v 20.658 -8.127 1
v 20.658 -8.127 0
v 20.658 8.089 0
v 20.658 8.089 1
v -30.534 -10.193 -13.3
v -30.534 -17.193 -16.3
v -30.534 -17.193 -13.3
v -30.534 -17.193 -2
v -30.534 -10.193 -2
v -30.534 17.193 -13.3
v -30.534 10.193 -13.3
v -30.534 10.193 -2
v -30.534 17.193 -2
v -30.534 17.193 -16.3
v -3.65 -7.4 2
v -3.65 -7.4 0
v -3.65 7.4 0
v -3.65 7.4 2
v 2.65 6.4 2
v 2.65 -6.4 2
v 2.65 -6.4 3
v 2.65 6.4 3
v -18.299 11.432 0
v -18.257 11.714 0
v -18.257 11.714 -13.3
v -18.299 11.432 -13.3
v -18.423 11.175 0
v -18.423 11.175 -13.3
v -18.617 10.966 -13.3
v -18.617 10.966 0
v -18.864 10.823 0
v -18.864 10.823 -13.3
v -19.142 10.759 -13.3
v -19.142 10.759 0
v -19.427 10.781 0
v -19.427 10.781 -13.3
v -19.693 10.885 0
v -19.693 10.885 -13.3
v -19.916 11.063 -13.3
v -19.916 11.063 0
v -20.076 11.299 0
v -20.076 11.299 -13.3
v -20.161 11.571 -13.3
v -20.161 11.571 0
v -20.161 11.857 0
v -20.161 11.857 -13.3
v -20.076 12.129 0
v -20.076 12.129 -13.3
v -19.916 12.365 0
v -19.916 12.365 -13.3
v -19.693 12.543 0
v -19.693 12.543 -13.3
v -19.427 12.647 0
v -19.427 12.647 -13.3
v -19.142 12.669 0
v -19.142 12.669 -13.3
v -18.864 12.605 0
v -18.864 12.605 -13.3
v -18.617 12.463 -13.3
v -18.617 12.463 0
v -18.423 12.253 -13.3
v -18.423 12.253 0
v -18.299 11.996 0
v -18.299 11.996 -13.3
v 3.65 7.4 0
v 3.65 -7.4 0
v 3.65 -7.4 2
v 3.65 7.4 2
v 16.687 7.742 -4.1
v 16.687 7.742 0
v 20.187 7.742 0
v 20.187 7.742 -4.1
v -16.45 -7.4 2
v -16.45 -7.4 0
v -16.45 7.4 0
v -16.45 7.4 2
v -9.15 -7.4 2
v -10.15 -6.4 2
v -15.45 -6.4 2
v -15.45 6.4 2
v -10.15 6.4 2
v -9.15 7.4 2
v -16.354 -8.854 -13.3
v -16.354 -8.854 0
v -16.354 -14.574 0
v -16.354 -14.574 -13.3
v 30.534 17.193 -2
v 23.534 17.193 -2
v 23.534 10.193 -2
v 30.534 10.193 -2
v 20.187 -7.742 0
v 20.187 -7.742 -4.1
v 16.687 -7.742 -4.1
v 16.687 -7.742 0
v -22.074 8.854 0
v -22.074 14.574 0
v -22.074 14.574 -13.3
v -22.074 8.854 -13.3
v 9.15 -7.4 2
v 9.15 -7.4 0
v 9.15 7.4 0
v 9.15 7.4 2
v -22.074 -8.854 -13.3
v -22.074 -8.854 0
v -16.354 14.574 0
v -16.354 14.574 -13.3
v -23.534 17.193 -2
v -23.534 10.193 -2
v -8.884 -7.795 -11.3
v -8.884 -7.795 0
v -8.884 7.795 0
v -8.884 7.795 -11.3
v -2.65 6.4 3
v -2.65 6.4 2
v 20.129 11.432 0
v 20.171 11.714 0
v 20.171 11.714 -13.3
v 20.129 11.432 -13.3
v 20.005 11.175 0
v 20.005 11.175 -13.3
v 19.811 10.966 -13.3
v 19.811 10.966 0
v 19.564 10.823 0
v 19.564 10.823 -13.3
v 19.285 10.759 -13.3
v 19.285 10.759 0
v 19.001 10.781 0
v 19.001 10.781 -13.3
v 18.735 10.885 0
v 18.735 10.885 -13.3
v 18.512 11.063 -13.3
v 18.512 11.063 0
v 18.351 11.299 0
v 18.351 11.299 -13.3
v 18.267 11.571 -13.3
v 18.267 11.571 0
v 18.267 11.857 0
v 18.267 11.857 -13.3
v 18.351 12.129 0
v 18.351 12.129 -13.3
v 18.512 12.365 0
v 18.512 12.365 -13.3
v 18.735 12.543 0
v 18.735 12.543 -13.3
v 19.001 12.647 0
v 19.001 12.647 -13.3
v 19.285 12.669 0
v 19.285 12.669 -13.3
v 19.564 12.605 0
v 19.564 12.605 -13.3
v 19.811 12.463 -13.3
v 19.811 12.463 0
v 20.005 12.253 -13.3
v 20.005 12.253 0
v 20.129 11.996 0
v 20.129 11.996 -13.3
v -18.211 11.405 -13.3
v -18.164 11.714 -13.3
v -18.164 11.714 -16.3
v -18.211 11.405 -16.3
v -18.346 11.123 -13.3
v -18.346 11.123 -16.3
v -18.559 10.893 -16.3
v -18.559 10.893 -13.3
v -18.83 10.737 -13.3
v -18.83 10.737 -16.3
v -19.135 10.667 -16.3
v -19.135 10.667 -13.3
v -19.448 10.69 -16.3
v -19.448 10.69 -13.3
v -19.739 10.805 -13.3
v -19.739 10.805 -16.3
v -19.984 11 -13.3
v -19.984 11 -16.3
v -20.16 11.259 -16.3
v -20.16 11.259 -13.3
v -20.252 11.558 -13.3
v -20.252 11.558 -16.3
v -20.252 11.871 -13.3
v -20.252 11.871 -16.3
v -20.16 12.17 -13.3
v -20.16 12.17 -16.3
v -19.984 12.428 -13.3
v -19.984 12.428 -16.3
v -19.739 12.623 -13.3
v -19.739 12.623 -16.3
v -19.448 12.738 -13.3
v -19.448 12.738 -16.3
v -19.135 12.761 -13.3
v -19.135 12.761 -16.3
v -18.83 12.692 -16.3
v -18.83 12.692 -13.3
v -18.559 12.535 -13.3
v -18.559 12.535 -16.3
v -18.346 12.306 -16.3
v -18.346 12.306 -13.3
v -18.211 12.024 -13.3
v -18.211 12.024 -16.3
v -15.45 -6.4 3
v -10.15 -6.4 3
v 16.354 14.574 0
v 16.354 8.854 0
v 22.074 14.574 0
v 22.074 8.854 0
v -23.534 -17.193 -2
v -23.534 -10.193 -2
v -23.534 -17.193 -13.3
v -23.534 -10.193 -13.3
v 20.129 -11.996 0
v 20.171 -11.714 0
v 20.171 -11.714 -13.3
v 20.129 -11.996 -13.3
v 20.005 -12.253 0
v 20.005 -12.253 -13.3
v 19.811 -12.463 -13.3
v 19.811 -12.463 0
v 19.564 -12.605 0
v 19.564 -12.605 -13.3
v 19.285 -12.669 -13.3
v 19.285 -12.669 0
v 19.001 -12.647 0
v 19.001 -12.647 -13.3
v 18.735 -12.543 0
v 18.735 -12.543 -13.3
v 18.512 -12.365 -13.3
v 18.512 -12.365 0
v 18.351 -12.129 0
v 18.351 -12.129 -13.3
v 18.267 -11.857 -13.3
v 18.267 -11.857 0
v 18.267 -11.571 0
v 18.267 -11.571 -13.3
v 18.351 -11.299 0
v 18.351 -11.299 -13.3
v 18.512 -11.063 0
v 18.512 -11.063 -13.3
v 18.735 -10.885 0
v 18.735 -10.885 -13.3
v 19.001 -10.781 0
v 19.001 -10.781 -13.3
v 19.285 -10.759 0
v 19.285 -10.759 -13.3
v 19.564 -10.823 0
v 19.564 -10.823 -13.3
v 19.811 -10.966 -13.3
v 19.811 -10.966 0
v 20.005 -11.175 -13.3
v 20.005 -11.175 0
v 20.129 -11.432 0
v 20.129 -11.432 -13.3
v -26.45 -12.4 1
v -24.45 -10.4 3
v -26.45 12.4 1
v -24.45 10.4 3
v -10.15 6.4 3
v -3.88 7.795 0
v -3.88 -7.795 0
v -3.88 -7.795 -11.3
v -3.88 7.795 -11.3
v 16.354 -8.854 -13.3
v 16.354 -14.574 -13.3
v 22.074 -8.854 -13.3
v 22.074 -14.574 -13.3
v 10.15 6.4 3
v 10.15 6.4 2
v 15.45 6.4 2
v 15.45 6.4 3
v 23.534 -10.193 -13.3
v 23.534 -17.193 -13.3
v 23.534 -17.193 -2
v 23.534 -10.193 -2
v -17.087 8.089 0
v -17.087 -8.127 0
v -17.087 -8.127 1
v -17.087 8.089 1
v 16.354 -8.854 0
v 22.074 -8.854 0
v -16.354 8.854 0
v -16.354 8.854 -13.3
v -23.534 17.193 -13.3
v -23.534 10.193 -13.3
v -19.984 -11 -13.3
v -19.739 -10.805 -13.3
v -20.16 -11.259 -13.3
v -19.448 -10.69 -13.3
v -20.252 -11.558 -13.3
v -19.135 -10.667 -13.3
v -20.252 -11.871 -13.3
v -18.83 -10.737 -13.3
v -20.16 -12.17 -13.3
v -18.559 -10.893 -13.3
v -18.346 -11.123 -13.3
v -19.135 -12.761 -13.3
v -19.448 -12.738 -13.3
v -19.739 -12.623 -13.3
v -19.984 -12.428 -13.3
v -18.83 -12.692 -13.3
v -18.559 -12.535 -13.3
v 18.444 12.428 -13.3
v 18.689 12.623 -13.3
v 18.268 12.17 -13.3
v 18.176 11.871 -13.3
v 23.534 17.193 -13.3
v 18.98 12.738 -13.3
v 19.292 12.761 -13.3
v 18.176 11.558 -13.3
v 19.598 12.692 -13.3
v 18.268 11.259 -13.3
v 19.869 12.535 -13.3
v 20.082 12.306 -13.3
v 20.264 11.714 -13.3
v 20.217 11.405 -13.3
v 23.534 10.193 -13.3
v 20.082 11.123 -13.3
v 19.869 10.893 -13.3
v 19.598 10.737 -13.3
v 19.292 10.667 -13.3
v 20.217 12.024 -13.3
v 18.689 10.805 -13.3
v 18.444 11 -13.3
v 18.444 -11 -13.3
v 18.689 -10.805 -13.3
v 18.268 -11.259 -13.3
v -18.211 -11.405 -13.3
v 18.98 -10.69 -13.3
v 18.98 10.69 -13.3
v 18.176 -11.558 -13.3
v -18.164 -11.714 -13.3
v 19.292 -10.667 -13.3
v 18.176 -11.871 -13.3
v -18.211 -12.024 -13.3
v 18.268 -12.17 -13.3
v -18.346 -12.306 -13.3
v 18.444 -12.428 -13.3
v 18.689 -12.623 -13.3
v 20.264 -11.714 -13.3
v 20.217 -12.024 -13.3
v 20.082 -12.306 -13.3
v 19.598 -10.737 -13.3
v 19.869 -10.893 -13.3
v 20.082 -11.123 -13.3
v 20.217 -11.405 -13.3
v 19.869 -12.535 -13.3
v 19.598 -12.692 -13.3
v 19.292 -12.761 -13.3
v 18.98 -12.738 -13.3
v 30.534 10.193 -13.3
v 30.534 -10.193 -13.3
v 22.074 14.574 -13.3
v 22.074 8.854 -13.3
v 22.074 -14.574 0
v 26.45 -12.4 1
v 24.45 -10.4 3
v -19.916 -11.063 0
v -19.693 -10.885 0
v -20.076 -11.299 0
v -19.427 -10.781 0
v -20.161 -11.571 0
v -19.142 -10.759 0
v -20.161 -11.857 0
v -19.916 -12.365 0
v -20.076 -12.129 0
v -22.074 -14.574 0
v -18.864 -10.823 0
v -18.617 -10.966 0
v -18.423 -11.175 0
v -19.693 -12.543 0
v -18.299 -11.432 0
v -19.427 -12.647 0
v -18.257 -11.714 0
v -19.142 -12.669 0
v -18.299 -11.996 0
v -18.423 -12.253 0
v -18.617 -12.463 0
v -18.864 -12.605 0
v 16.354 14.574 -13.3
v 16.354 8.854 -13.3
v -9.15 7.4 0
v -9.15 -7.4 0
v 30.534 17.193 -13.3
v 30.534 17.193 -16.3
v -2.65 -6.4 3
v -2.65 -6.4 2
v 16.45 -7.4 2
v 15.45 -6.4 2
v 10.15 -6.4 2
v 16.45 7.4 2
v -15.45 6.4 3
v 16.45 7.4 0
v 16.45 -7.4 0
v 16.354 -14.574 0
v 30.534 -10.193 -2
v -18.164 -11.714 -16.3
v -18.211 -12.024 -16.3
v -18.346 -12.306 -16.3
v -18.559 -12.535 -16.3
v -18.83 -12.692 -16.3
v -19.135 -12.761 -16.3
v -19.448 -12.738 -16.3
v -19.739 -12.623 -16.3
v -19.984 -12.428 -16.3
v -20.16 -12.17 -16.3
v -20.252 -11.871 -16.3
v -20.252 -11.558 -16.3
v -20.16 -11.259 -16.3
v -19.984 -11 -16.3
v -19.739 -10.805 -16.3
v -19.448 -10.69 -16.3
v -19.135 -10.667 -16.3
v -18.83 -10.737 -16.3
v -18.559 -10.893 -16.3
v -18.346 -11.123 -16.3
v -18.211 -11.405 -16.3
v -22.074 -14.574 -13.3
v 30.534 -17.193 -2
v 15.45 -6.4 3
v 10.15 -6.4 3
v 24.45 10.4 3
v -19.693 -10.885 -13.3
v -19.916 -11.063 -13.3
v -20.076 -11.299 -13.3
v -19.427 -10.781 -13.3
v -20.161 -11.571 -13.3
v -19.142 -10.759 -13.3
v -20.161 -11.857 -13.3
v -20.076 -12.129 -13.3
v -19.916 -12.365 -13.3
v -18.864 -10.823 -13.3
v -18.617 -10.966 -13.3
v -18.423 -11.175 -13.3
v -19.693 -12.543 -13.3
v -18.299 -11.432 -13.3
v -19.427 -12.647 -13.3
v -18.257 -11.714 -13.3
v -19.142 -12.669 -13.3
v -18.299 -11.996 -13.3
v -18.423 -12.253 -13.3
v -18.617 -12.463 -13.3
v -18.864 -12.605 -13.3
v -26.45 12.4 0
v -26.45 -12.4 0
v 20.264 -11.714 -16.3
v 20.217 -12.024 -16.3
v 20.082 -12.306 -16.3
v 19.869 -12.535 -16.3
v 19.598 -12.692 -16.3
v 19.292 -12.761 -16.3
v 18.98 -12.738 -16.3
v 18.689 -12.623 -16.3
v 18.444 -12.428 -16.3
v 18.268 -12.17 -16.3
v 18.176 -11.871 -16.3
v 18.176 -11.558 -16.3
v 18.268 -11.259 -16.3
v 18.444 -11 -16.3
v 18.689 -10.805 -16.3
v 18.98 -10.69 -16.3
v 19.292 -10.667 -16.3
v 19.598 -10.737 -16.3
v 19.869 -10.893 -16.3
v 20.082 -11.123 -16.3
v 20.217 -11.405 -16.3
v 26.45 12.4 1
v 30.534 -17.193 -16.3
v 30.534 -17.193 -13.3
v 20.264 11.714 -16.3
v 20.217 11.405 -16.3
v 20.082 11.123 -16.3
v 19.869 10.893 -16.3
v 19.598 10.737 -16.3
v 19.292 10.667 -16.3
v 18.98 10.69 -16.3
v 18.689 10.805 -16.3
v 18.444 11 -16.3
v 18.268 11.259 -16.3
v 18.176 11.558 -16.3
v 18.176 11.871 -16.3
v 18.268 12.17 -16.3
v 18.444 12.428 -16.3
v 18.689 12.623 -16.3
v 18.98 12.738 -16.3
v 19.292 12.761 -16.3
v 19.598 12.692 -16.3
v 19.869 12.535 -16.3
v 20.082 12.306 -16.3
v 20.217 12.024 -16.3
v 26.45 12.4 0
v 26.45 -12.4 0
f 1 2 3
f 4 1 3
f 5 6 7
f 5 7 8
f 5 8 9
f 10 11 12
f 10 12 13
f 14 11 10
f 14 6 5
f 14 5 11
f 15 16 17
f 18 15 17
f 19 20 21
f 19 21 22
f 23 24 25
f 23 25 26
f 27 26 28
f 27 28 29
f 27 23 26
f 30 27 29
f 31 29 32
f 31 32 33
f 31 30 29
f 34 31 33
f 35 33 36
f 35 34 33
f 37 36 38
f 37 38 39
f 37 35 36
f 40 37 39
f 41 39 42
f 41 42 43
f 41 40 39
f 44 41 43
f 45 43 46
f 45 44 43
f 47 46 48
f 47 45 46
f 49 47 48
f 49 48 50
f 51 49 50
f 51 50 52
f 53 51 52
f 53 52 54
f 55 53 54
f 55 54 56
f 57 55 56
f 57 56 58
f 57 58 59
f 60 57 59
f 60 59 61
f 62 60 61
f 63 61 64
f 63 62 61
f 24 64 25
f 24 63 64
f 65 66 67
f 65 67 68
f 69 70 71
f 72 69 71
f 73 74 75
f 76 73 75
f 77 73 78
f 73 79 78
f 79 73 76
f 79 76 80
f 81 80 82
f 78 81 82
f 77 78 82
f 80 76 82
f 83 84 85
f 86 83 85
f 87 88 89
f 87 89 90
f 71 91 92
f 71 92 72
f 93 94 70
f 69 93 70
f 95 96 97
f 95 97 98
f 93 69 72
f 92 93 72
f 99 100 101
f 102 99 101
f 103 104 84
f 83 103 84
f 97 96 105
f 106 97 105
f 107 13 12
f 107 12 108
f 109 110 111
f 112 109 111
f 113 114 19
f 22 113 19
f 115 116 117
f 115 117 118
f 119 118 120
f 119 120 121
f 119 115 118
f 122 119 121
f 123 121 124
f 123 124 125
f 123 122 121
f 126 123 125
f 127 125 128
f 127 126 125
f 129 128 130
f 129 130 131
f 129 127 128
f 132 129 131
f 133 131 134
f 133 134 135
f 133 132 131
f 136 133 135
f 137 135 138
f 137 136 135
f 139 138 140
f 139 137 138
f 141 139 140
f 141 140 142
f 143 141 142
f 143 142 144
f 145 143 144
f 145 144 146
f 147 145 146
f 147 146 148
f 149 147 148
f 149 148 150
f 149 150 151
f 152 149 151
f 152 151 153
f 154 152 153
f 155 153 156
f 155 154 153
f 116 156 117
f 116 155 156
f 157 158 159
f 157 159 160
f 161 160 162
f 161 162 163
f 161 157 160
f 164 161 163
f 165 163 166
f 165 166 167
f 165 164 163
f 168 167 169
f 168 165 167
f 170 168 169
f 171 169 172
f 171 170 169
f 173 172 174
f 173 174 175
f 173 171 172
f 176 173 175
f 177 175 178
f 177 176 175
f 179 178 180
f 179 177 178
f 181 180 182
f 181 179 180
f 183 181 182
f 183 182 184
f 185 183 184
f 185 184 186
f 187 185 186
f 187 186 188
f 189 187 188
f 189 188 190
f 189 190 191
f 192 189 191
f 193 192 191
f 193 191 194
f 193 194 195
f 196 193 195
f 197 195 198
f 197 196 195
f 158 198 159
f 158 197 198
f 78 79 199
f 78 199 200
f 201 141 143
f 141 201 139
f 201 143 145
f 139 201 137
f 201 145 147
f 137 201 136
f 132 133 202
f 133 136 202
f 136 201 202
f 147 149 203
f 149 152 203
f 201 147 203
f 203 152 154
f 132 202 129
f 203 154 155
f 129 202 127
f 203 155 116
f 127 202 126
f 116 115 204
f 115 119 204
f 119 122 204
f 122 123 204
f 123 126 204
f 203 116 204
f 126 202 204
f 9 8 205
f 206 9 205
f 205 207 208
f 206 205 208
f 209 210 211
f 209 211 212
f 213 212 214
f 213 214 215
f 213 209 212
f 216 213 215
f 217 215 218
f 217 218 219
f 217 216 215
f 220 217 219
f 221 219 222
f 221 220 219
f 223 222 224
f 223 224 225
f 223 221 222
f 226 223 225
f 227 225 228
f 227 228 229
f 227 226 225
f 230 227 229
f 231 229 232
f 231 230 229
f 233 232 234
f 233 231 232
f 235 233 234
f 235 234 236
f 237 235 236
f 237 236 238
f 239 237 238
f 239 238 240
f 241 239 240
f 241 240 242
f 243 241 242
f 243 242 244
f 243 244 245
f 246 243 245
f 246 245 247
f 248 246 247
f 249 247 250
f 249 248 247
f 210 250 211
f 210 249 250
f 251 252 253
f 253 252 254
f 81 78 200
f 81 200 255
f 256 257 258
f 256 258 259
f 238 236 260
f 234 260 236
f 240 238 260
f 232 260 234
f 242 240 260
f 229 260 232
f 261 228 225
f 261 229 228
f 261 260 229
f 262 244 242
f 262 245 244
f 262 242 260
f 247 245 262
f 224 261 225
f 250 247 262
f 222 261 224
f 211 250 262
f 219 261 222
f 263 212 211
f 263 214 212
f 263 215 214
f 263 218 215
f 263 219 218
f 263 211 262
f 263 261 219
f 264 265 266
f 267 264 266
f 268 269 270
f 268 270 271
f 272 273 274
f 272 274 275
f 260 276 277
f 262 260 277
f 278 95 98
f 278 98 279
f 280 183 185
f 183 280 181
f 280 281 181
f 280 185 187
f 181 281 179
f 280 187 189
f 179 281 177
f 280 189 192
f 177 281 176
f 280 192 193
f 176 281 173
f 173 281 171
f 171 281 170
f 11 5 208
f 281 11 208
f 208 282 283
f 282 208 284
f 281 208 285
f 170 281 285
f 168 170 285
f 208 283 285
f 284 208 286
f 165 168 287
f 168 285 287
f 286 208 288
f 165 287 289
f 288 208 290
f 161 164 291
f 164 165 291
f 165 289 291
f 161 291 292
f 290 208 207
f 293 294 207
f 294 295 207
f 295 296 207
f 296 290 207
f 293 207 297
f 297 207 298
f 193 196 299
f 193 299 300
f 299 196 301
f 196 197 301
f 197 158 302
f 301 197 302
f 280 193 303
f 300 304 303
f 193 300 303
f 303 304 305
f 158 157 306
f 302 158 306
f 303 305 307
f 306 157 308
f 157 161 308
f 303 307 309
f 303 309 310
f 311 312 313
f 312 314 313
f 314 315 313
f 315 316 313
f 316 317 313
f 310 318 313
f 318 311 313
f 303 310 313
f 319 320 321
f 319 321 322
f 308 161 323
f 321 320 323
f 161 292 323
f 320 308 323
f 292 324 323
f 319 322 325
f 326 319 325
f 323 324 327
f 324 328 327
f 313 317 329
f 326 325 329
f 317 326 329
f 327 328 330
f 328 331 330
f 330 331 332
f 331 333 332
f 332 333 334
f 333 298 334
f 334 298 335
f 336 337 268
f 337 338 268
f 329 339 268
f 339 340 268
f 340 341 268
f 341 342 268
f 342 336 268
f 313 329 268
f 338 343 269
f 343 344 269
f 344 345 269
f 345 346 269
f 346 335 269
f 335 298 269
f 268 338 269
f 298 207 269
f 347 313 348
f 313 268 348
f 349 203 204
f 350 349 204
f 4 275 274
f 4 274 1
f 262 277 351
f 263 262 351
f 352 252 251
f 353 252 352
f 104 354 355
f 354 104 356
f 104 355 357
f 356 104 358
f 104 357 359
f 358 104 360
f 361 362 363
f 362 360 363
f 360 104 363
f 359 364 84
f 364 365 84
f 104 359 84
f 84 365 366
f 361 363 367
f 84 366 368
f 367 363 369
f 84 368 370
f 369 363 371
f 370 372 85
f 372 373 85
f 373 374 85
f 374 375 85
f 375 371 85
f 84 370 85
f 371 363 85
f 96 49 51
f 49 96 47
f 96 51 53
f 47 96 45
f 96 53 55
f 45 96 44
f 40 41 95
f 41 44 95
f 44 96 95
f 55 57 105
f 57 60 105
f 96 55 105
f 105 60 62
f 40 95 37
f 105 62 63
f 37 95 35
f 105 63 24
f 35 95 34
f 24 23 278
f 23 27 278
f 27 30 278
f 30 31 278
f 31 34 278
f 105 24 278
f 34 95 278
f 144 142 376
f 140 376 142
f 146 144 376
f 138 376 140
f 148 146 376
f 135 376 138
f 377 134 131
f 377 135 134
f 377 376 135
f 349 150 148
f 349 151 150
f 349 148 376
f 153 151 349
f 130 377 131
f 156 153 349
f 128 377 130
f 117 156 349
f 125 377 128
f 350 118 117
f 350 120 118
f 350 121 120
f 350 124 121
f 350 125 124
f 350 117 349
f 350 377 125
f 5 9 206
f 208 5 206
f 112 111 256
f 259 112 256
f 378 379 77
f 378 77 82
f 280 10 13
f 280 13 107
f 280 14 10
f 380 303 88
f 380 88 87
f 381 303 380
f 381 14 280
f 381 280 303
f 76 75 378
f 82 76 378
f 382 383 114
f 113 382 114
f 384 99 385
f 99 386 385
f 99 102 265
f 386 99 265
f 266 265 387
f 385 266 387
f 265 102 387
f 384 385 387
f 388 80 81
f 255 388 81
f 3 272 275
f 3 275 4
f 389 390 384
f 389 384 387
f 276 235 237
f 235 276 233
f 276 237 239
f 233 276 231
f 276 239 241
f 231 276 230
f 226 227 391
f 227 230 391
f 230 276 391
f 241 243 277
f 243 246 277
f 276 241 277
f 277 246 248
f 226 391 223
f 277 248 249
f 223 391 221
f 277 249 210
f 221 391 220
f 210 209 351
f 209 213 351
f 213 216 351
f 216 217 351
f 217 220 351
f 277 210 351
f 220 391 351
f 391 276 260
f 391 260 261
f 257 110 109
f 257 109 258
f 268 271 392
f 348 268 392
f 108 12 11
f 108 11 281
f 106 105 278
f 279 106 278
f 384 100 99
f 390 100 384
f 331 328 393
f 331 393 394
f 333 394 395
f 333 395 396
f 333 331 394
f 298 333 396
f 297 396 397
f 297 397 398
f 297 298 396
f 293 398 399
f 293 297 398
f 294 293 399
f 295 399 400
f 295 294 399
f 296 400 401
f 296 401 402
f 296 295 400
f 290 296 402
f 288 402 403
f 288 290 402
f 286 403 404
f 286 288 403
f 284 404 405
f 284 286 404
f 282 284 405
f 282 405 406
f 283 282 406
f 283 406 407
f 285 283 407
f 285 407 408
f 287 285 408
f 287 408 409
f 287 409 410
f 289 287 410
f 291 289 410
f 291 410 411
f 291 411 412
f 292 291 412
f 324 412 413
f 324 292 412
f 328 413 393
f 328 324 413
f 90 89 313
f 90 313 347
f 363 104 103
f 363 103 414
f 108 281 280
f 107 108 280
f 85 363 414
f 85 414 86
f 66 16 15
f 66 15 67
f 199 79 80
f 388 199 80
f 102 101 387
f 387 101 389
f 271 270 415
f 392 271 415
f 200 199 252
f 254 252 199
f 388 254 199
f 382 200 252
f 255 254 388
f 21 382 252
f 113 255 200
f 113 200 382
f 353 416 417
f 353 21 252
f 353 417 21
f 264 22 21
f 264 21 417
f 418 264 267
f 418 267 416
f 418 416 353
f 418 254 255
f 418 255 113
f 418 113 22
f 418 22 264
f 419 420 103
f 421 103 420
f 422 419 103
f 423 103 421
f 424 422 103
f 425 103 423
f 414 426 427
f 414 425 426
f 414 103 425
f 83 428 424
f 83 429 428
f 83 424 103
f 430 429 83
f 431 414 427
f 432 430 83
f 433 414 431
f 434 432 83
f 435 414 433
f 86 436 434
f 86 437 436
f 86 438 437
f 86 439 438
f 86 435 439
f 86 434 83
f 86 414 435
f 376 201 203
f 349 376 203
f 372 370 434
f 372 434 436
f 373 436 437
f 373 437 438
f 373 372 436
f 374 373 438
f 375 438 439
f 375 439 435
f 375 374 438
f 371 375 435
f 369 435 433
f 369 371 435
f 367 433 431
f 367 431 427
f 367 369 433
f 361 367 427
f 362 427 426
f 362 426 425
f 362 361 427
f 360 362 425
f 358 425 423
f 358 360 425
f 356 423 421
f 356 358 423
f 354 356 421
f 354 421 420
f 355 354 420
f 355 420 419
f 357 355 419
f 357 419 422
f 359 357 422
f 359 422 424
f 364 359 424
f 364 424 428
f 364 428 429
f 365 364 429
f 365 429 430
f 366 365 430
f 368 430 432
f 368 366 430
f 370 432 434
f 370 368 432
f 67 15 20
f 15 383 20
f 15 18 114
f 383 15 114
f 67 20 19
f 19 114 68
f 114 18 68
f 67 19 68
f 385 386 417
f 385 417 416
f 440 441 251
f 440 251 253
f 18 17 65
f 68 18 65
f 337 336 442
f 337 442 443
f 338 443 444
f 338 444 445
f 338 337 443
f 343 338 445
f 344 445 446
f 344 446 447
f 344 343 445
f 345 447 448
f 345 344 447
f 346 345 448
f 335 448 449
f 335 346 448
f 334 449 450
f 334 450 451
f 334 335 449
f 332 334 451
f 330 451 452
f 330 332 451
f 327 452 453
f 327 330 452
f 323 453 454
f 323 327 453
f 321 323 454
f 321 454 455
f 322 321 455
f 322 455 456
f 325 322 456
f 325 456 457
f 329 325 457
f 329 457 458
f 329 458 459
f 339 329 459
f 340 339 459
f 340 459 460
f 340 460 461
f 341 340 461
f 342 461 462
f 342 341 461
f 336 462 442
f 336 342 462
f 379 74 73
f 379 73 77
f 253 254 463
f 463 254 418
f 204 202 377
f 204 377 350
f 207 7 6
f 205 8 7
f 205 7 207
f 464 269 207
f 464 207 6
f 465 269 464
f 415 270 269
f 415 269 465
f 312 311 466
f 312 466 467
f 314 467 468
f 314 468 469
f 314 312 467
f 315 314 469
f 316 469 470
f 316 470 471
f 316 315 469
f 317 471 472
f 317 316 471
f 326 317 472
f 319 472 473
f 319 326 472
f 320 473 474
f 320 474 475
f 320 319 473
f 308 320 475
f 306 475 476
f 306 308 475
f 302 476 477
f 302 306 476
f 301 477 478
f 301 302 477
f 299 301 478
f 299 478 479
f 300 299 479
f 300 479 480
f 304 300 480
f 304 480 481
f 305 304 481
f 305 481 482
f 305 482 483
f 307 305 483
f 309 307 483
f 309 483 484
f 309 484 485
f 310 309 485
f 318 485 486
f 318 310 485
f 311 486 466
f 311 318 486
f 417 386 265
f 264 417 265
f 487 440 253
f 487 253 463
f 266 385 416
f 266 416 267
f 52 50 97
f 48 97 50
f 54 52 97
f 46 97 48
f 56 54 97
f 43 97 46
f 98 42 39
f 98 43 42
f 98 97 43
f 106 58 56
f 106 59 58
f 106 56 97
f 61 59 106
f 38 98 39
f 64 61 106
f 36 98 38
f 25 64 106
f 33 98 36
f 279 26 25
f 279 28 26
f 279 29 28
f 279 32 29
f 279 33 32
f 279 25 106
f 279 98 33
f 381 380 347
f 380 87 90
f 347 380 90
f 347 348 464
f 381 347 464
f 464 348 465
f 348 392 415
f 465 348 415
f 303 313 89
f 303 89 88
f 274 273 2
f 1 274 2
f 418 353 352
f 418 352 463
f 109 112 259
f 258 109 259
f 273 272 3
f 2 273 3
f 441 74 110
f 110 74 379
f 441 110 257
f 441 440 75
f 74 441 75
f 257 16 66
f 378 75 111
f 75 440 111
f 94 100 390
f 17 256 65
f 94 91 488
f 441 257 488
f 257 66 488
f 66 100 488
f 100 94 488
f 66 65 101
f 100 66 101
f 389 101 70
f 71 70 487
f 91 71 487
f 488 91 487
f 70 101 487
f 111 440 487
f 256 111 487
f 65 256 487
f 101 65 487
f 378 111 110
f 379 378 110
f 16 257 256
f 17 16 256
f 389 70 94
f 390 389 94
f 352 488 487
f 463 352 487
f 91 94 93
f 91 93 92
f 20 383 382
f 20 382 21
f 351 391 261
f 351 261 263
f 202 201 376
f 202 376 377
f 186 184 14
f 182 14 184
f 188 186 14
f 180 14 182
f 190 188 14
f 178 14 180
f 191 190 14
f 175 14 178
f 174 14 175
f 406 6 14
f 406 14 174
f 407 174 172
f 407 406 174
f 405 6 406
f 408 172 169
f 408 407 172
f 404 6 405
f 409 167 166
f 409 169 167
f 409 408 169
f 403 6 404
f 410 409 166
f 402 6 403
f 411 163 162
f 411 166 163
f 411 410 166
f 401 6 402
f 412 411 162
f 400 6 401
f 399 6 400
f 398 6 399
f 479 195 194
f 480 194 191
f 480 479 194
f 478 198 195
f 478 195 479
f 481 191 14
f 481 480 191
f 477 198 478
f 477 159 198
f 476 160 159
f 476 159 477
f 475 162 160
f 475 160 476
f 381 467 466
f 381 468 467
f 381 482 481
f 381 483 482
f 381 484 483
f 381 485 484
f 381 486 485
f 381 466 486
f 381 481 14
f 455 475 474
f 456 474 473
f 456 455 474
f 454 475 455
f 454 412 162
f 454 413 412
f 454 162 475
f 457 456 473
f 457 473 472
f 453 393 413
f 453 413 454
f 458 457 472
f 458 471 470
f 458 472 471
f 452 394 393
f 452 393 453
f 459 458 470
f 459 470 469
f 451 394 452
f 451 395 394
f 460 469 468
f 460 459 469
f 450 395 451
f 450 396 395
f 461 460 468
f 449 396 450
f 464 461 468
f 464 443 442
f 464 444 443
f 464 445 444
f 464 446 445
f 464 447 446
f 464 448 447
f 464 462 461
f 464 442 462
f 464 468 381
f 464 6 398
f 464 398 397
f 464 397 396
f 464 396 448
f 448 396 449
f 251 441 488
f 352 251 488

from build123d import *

# Parameters (mm, degrees)
F1_W      = 52.9
F1_H      = 24.8
F1_W_2    = 7.3
F1_H_2    = 14.8
F3_DEPTH  = 3
F4_SIZE   = 2
F5_W      = 5.0038062036
F5_H      = 15.5897745863
F6_DEPTH  = 11.3
F7_W      = 3.5
F7_H      = 15.4839724309
F8_DEPTH  = 4.1
F9_W      = 5.7202084002
F9_H      = 5.7202084002
F9_R      = 0.9572995055
F10_DEPTH = 13.3
F11_W     = 61.0684901476
F11_H     = 34.3860425055
F11_R     = 1.05
F11_W_2   = 5.7202084002
F11_H_2   = 5.7202084002
F12_DEPTH = 3
F13_W     = 7
F13_H     = 7
F15_DEPTH = 11.3
F16_W     = 5.3
F16_H     = 12.8
F17_DEPTH = 3
F18_DEPTH = 2
F19_W     = 37.7444140613
F19_H     = 16.21611882
F20_DEPTH = 1


with BuildPart() as f3:
    # F1 (on Top) → F3 (new body)
    with BuildSketch(Plane.XY):
        Rectangle(F1_W, F1_H)
        with Locations((-12.8, 0)):
            Rectangle(F1_W_2, F1_H_2, mode=Mode.SUBTRACT)
        Rectangle(F1_W_2, F1_H_2, mode=Mode.SUBTRACT)
        with Locations((12.8, 0)):
            Rectangle(F1_W_2, F1_H_2, mode=Mode.SUBTRACT)
        with Locations((-12.8, 0)):
            Rectangle(F1_W_2, F1_H_2)
        Rectangle(F1_W_2, F1_H_2)
        with Locations((12.8, 0)):
            Rectangle(F1_W_2, F1_H_2)
    extrude(amount=F3_DEPTH)

    # F4
    f4_edges = [f3.edges().sort_by_distance(p)[0] for p in [
        (0, 12.4, 3),
        (-26.45, 0, 3),
        (0, -12.4, 3),
        (26.45, 0, 3),
    ]]
    chamfer(f4_edges, length=F4_SIZE)

    # F5 (on face) → F6 (join)
    with BuildSketch(Plane.XY):
        with Locations((-6.3821640797, 0)):
            Rectangle(F5_W, F5_H)
    extrude(amount=-F6_DEPTH)

    # F7 (on face) → F8 (join)
    with BuildSketch(Plane.XY):
        with Locations((18.4370409697, 0)):
            Rectangle(F7_W, F7_H)
    extrude(amount=-F8_DEPTH)

    # F16 (on Top) → F17 (cut)
    with BuildSketch(Plane.XY):
        with Locations((-12.8, 0)):
            Rectangle(F16_W, F16_H)
        Rectangle(F16_W, F16_H)
        with Locations((12.8, 0)):
            Rectangle(F16_W, F16_H)
    extrude(amount=F17_DEPTH, mode=Mode.SUBTRACT)

    # F1 (on Top) → F18 (cut)
    with BuildSketch(Plane.XY):
        with Locations((-12.8, 0)):
            Rectangle(F1_W_2, F1_H_2)
        Rectangle(F1_W_2, F1_H_2)
        with Locations((12.8, 0)):
            Rectangle(F1_W_2, F1_H_2)
    extrude(amount=F18_DEPTH, mode=Mode.SUBTRACT)


with BuildPart() as f10:
    # F9 (on face) → F10 (new body)
    with BuildSketch(Plane(origin=(0, 0, 0), x_dir=(1, 0, 0), z_dir=(0, 0, -1))):
        with Locations((-19.2139537245, 11.7141148951)):
            Rectangle(F9_W, F9_H)
        with Locations((-19.2139537245, 11.7141148951)):
            Circle(F9_R, mode=Mode.SUBTRACT)
    extrude(amount=F10_DEPTH)


with BuildPart() as f10b:
    # F9 (on face) → F10, piece 2 (new body)
    with BuildSketch(Plane(origin=(0, 0, 0), x_dir=(1, 0, 0), z_dir=(0, 0, -1))):
        with Locations((19.2139537245, 11.7141148951)):
            Rectangle(F9_W, F9_H)
        with Locations((19.2139537245, 11.7141148951)):
            Circle(F9_R, mode=Mode.SUBTRACT)
    extrude(amount=F10_DEPTH)


with BuildPart() as f10c:
    # F9 (on face) → F10, piece 3 (new body)
    with BuildSketch(Plane(origin=(0, 0, 0), x_dir=(1, 0, 0), z_dir=(0, 0, -1))):
        with Locations((-19.2139537245, -11.7141148951)):
            Rectangle(F9_W, F9_H)
        with Locations((-19.2139537245, -11.7141148951)):
            Circle(F9_R, mode=Mode.SUBTRACT)
    extrude(amount=F10_DEPTH)


with BuildPart() as f10d:
    # F9 (on face) → F10, piece 4 (new body)
    with BuildSketch(Plane(origin=(0, 0, 0), x_dir=(1, 0, 0), z_dir=(0, 0, -1))):
        with Locations((19.2139537245, -11.7141148951)):
            Rectangle(F9_W, F9_H)
        with Locations((19.2139537245, -11.7141148951)):
            Circle(F9_R, mode=Mode.SUBTRACT)
    extrude(amount=F10_DEPTH)


with BuildPart() as f12:
    # F11 (on face) → F12 (new body)
    with BuildSketch(Plane(origin=(0, 0, -13.3), x_dir=(1, 0, 0), z_dir=(0, 0, -1))):
        Rectangle(F11_W, F11_H)
        with Locations((-19.2139537245, -11.7141148951)):
            Circle(F11_R, mode=Mode.SUBTRACT)
        with Locations((19.2139537245, -11.7141148951)):
            Circle(F11_R, mode=Mode.SUBTRACT)
        with Locations((-19.2139537245, 11.7141148951)):
            Rectangle(F11_W_2, F11_H_2, mode=Mode.SUBTRACT)
        with Locations((19.2139537245, 11.7141148951)):
            Circle(F11_R, mode=Mode.SUBTRACT)
        with Locations((-19.2139537245, 11.7141148951)):
            Rectangle(F11_W_2, F11_H_2)
        with Locations((-19.2139537245, 11.7141148951)):
            Circle(F11_R, mode=Mode.SUBTRACT)
    extrude(amount=F12_DEPTH)

    # F13 (on face) → F15 (join)
    with BuildSketch(Plane.XY.offset(-13.3)):
        with Locations((-27.0342450738, 13.6930212528)):
            Rectangle(F13_W, F13_H)
        with Locations((27.0342450738, 13.6930212528)):
            Rectangle(F13_W, F13_H)
        with Locations((27.0342450738, -13.6930212528)):
            Rectangle(F13_W, F13_H)
        with Locations((-27.0342450738, -13.6930212528)):
            Rectangle(F13_W, F13_H)
    extrude(amount=F15_DEPTH)


with BuildPart() as f20:
    # F19 (on Top) → F20 (new body)
    with BuildSketch(Plane.XY):
        with Locations((1.7853435129, -0.0187330879)):
            Rectangle(F19_W, F19_H)
    extrude(amount=F20_DEPTH)


solid = Compound([f3.part, f10.part, f10b.part, f10c.part, f10d.part, f12.part, f20.part])
